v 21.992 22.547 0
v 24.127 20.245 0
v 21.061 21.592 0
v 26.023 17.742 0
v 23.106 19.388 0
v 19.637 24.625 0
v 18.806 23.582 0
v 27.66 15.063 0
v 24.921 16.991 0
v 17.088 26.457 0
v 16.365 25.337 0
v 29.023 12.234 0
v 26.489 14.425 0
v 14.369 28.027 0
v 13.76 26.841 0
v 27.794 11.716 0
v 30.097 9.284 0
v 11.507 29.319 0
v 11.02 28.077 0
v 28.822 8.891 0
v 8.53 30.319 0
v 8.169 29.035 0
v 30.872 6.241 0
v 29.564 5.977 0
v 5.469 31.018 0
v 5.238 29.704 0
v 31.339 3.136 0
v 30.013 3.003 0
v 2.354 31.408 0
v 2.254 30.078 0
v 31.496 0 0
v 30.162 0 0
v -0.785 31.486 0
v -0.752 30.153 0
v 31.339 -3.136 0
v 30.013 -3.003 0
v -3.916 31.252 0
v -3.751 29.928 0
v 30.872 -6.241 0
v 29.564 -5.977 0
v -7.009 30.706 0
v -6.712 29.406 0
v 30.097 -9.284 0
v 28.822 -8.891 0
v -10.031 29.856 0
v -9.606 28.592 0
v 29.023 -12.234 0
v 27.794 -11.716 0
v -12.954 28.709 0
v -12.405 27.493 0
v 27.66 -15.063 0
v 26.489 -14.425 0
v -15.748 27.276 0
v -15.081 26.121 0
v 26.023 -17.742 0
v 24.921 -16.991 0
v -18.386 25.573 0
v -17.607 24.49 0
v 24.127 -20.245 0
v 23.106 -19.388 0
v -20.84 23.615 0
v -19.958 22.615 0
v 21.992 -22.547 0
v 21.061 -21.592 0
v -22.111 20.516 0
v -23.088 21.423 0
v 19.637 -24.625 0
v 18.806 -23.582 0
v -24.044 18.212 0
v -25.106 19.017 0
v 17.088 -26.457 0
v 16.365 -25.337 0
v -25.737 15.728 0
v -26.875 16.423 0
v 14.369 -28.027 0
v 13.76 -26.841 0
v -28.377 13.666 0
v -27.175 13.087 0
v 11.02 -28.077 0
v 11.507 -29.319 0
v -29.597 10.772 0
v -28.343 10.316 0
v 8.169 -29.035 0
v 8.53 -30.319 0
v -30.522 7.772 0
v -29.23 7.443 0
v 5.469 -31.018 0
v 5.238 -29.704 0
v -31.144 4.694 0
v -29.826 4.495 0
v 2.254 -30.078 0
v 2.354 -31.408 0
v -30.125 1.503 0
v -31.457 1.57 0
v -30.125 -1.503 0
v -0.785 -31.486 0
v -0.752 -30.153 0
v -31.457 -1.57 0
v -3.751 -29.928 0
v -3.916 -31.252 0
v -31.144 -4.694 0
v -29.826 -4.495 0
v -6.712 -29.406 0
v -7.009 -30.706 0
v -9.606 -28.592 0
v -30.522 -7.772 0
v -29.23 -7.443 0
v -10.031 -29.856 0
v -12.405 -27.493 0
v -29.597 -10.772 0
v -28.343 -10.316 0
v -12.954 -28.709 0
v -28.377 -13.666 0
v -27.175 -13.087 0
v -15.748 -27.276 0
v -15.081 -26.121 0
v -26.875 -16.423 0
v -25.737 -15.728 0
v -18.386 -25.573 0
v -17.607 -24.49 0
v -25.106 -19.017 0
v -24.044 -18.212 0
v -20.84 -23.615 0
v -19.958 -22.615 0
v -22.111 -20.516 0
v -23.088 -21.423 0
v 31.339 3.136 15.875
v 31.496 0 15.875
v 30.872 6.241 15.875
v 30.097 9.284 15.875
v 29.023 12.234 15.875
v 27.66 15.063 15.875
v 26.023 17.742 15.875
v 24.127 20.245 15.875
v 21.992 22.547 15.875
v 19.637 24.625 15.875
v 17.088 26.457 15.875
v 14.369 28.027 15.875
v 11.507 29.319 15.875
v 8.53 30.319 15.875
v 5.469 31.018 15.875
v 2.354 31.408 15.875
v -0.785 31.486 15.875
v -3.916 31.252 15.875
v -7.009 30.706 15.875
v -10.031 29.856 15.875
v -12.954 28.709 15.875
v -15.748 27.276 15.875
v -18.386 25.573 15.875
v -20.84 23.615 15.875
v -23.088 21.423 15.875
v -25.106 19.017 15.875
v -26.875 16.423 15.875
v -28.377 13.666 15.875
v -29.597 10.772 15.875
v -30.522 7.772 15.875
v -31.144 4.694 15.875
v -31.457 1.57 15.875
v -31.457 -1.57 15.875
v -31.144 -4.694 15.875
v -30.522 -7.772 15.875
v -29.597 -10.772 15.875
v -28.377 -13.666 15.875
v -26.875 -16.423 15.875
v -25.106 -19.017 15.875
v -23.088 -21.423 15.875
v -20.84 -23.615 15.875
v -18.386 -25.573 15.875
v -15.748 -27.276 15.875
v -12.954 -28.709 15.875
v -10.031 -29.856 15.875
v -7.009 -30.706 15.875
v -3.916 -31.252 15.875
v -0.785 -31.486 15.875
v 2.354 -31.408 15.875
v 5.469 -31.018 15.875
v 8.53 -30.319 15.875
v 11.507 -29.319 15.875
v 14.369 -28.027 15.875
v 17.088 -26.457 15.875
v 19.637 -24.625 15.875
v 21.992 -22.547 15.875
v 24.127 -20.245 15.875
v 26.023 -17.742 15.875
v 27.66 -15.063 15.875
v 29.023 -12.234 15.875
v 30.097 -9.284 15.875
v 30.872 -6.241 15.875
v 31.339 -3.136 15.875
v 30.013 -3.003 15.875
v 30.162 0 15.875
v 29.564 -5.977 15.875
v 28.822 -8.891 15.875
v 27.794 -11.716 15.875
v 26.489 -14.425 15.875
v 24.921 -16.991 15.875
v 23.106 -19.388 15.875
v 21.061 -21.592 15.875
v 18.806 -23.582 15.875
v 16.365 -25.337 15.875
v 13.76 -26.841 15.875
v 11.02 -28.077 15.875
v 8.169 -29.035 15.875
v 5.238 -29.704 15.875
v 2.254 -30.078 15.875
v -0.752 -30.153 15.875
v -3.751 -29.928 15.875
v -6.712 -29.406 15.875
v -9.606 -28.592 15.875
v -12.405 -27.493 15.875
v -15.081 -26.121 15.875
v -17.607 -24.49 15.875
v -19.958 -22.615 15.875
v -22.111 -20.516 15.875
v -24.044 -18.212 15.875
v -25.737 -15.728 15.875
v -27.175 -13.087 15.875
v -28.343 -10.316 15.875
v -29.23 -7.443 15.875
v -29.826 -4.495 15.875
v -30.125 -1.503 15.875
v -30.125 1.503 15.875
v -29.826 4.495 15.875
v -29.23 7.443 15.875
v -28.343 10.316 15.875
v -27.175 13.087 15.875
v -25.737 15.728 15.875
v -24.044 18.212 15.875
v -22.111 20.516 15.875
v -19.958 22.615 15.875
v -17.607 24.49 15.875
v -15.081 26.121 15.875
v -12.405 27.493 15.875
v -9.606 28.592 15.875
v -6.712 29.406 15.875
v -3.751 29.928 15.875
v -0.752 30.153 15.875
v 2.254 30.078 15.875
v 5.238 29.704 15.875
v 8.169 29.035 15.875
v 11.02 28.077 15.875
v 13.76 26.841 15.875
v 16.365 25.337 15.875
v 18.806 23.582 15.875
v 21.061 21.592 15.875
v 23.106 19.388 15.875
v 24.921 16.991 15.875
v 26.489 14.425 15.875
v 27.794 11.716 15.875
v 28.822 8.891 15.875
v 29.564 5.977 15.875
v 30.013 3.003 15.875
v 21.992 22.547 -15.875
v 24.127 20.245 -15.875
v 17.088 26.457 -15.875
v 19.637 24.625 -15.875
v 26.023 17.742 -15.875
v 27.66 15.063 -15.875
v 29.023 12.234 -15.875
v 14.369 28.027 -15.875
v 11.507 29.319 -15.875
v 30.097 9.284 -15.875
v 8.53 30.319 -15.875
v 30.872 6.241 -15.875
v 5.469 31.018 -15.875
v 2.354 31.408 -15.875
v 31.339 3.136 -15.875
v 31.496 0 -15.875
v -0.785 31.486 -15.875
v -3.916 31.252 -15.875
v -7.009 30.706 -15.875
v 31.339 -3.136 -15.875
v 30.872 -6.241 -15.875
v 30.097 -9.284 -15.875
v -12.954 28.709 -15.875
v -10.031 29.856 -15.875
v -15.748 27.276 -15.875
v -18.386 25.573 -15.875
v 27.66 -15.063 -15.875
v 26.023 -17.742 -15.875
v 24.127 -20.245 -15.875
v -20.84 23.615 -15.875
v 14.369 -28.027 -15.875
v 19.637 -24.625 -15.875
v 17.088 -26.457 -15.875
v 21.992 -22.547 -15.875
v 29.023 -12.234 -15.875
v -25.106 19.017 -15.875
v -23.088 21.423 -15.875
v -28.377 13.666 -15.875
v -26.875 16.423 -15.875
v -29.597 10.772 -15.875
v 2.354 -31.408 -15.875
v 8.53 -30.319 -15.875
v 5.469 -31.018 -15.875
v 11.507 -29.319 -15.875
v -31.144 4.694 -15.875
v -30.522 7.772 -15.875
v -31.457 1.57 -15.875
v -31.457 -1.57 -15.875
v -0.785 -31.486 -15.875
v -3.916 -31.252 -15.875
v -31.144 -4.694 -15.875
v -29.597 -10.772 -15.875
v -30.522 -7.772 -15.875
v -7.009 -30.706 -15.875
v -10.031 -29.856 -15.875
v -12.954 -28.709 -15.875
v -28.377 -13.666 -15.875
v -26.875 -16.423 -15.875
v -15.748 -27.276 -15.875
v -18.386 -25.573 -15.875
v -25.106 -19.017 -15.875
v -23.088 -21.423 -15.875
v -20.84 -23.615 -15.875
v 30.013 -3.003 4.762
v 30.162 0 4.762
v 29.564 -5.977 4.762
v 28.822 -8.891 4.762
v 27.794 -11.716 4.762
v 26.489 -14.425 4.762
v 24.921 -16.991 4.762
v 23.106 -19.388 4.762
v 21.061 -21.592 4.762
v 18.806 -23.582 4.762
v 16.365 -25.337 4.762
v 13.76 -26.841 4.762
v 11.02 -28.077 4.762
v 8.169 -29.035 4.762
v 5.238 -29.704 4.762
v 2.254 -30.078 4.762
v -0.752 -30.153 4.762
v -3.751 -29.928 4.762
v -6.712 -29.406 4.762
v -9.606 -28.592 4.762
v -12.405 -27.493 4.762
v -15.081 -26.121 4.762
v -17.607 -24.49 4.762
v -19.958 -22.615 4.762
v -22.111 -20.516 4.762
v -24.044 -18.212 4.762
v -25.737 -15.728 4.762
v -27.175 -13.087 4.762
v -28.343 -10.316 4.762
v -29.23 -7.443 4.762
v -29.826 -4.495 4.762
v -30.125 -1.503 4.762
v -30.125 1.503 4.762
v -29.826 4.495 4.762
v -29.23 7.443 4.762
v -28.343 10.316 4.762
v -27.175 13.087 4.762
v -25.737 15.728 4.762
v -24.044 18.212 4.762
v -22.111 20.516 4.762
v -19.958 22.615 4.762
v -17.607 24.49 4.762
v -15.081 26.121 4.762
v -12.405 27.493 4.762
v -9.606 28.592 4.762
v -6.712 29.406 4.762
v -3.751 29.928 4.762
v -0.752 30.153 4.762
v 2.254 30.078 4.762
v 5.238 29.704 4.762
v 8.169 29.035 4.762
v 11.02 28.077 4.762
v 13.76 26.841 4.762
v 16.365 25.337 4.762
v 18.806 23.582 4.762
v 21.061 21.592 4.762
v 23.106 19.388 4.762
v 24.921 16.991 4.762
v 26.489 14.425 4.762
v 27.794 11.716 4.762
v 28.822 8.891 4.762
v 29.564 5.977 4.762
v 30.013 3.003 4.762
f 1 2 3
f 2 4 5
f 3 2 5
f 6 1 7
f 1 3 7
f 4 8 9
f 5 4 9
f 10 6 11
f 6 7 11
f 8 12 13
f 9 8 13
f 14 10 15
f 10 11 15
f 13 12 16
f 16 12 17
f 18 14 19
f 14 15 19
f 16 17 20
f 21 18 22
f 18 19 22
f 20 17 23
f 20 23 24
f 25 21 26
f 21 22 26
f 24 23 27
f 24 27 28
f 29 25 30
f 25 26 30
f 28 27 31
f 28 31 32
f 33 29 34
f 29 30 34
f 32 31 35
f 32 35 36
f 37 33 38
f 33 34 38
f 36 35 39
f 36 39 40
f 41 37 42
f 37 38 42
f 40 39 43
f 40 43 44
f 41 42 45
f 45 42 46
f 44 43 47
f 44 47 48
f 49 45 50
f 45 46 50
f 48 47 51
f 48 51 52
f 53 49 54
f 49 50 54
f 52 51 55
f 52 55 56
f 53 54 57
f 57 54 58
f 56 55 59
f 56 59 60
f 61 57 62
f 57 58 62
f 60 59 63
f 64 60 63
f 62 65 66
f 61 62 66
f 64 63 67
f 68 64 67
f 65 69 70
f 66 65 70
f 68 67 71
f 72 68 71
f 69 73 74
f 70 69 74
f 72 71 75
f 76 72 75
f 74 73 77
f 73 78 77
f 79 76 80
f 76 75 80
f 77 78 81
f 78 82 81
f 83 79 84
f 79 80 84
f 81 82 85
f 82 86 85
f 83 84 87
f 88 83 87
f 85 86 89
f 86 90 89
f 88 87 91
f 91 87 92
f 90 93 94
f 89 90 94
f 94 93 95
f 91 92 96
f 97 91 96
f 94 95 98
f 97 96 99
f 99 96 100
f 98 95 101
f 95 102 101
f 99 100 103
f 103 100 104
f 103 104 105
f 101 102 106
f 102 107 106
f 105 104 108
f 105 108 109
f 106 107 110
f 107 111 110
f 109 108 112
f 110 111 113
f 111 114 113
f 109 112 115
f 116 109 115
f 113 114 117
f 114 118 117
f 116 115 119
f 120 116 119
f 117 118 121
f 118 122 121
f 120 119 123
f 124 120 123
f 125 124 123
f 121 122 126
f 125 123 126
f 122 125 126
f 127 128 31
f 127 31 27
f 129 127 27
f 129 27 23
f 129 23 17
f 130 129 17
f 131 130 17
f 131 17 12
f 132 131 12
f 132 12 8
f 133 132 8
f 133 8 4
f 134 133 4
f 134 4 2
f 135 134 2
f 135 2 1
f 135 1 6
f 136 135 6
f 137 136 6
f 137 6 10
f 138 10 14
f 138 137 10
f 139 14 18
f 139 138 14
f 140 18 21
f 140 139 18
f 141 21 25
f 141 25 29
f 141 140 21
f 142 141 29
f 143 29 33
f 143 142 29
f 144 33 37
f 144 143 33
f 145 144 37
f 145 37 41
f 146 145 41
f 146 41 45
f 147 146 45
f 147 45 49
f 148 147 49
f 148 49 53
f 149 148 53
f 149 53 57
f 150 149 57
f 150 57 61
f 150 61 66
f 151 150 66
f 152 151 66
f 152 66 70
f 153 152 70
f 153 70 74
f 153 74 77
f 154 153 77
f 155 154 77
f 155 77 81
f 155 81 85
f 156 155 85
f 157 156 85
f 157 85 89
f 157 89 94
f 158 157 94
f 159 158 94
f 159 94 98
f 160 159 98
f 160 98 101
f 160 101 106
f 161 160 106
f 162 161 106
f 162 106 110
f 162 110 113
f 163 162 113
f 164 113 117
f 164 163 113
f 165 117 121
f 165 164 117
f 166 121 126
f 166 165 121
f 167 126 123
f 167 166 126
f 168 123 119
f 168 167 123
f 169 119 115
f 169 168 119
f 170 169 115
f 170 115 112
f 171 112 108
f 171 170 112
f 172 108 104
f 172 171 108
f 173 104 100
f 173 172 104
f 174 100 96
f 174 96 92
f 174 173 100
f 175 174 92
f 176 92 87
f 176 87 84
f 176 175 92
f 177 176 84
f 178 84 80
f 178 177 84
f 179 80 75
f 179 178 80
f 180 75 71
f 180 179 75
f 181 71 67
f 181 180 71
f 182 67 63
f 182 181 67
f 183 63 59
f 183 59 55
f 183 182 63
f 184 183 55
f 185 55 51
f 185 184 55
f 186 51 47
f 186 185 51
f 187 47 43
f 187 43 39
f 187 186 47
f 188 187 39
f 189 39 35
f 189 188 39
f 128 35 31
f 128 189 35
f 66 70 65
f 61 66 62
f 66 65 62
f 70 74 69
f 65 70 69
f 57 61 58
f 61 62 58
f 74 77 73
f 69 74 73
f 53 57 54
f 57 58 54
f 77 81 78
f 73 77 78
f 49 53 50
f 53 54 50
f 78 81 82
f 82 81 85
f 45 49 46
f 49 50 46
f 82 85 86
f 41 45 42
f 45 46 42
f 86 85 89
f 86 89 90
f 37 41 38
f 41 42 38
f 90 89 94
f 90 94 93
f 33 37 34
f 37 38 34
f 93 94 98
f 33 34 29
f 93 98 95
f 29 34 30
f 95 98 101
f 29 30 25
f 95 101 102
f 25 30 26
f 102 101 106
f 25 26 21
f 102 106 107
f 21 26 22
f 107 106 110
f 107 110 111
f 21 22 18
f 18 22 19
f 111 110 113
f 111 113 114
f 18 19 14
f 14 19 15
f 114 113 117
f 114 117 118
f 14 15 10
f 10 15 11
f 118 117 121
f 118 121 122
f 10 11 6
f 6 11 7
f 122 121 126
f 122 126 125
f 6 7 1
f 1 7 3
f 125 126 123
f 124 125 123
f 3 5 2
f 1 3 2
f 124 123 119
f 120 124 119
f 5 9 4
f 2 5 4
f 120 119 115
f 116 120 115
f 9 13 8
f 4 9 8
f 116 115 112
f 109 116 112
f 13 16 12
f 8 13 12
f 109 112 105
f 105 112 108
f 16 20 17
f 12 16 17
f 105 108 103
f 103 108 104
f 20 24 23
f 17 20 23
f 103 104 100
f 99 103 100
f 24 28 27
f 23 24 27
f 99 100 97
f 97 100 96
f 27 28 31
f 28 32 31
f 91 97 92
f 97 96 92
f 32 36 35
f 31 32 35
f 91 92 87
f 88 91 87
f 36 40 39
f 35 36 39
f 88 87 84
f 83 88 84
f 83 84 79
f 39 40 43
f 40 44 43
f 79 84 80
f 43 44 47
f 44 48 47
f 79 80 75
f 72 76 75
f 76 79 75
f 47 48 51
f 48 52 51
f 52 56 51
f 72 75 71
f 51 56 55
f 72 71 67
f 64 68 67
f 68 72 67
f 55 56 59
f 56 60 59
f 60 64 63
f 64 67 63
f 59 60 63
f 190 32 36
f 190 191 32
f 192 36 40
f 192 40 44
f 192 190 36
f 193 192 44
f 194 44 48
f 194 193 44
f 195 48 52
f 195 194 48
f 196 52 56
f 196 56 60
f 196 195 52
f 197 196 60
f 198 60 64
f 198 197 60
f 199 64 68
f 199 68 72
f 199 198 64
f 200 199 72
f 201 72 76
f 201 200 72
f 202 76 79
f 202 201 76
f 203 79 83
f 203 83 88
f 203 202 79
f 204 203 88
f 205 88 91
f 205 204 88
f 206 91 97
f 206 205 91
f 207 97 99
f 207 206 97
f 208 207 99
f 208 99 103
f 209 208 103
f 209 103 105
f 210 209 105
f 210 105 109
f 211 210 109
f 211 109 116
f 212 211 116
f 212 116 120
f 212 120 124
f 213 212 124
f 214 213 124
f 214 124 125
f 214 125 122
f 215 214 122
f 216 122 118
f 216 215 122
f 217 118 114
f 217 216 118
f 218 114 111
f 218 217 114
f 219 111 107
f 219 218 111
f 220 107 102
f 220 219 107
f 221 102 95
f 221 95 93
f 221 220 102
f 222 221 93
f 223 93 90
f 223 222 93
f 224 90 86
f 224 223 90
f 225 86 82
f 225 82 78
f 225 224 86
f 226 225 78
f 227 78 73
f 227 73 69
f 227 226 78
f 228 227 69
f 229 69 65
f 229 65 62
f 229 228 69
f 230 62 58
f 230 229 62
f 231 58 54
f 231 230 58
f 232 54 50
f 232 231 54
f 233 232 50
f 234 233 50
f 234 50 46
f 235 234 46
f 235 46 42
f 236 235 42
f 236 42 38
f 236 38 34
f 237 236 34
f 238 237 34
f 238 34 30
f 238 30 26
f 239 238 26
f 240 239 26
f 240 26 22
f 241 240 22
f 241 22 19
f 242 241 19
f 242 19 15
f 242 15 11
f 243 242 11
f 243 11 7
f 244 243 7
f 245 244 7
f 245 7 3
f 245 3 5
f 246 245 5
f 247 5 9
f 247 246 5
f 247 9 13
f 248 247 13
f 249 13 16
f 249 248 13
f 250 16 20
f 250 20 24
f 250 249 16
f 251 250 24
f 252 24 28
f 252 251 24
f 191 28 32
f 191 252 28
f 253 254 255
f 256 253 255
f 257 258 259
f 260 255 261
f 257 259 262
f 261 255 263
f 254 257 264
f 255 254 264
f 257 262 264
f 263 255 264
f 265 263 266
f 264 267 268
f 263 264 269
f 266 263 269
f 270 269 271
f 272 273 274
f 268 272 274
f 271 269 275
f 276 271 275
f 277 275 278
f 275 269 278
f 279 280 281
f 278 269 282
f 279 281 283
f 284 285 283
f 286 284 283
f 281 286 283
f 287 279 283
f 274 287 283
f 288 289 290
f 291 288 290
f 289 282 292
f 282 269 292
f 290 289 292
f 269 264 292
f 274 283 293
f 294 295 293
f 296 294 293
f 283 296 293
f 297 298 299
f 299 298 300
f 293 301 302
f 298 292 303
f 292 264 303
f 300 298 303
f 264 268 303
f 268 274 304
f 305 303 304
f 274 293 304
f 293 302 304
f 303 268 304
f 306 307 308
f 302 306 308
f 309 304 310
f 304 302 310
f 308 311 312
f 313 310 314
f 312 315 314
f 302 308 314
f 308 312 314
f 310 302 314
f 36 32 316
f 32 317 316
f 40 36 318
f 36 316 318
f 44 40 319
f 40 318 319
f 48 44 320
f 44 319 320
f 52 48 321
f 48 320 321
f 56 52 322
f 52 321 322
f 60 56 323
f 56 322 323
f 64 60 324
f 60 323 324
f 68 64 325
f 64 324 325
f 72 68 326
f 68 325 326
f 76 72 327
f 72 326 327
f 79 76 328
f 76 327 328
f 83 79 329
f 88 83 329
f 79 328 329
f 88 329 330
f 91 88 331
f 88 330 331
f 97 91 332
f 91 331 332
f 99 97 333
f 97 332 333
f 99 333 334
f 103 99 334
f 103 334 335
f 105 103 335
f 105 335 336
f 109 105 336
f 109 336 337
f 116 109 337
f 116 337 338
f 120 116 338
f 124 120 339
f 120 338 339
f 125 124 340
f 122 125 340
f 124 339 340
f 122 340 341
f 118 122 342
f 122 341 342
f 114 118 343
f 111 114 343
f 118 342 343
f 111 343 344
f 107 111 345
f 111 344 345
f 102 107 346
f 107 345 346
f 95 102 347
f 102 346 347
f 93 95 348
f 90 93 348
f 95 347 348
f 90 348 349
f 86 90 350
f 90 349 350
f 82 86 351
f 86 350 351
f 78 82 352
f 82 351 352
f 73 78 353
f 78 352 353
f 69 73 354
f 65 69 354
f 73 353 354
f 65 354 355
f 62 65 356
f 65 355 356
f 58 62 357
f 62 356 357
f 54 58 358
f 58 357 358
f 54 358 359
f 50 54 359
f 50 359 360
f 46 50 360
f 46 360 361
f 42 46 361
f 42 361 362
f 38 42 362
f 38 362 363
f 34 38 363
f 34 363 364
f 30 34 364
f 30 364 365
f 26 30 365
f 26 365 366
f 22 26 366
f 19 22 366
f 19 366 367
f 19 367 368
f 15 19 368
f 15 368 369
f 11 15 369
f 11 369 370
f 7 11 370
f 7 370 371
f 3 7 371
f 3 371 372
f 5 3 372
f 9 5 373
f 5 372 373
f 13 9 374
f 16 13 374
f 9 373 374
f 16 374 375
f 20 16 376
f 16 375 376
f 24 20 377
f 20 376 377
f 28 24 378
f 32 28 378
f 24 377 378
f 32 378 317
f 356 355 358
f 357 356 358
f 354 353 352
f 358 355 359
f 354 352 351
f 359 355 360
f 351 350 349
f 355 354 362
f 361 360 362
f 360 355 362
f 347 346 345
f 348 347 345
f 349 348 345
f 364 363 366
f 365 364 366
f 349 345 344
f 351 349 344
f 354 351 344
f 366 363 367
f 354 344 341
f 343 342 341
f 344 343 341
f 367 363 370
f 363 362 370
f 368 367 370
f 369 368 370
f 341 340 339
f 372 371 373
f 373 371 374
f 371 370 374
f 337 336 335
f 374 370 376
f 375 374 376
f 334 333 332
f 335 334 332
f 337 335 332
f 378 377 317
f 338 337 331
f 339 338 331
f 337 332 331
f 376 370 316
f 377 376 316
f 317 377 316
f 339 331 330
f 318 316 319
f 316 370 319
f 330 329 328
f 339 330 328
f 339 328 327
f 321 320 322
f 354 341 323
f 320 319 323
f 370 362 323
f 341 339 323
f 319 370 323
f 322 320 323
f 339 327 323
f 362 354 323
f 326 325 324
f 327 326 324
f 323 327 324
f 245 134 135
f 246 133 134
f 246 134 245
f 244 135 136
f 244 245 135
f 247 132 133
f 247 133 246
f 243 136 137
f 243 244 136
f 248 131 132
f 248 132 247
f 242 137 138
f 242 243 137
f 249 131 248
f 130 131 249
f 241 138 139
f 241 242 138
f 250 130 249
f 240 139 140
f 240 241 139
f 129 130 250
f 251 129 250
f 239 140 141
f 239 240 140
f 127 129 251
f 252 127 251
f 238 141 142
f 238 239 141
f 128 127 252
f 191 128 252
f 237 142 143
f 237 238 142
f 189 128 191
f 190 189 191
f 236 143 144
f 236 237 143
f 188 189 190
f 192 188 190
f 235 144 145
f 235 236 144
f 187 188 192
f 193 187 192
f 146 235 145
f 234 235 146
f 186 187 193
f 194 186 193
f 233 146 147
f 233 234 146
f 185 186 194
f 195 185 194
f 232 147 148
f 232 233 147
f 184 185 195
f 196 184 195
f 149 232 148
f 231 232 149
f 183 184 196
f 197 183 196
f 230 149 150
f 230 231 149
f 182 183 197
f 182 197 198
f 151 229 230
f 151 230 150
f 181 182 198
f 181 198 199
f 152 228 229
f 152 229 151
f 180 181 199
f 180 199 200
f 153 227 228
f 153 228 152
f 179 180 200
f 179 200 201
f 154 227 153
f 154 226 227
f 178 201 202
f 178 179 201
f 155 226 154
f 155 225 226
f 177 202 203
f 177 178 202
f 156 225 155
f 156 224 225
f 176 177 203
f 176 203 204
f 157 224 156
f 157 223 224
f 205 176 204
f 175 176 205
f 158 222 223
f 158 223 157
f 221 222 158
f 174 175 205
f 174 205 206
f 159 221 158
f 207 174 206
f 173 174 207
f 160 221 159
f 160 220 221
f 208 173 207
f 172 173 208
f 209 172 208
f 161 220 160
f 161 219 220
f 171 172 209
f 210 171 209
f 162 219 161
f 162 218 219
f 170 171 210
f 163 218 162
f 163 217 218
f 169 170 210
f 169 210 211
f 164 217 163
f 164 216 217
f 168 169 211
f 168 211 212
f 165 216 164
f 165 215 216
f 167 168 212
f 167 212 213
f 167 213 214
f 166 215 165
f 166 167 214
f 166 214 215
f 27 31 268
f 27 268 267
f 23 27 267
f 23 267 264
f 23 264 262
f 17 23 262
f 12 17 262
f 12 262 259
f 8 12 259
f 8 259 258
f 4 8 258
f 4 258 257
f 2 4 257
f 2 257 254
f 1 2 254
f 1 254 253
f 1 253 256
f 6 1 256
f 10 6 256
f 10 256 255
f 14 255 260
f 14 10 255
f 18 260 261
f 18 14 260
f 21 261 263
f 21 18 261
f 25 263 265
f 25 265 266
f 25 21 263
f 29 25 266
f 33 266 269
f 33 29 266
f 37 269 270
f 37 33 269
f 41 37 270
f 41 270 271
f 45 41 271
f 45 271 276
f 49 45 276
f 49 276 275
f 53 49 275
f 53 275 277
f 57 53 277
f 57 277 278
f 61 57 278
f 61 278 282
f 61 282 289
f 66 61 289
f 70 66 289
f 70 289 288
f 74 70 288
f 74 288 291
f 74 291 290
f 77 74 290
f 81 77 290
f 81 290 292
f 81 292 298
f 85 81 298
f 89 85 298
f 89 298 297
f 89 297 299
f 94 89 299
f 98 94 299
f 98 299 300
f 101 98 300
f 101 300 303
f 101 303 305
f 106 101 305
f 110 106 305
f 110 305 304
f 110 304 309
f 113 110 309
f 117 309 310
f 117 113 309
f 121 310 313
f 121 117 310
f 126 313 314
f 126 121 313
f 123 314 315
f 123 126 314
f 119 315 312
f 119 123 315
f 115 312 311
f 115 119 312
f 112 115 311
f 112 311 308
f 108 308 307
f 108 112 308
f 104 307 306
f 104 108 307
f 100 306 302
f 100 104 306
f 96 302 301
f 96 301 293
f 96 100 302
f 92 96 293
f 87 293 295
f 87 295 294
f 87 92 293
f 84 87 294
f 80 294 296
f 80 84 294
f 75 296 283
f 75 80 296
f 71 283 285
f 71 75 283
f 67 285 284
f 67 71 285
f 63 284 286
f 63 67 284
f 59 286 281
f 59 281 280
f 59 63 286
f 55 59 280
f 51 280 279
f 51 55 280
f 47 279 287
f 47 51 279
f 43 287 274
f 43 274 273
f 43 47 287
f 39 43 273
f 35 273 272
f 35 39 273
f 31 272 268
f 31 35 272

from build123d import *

# Parameters (mm, degrees)
F3_W     = 1.5875
F3_H     = 15.875
F5_R     = 31.75
F5_R_2   = 31.496
F6_DEPTH = 31.751


with BuildPart() as f2:
    # F1 (on Front) → F2 (revolve)
    with BuildSketch(Plane.XZ):
        Polygon((30.1625, 0), (30.1625, 4.7625), (0, 4.7625), (0, -15.875), (31.75, -15.875), (31.75, 0), align=None)
    revolve(axis=Axis((0, 0, -16.009867), (0, 0, -1)))


with BuildPart() as f4:
    # F3 (on Front) → F4 (revolve)
    with BuildSketch(Plane.XZ):
        with Locations((30.95625, 7.9375)):
            Rectangle(F3_W, F3_H)
    revolve(axis=Axis((0, 0, -13.350507), (0, 0, -1)))


with BuildPart() as f6_tool:
    # F5 (on face) → F6 (new body, through all)
    with BuildSketch(Plane.XY.offset(15.875)):
        Circle(F5_R)
        Circle(F5_R_2, mode=Mode.SUBTRACT)
    extrude(amount=-F6_DEPTH)


with BuildPart() as f2_1:
    add(f2.part)

    # F6: cut by f6_tool
    add(f6_tool.part, mode=Mode.SUBTRACT)


with BuildPart() as f4_1:
    add(f4.part)

    # F6: cut by f6_tool
    add(f6_tool.part, mode=Mode.SUBTRACT)


solid = Compound([f2_1.part, f4_1.part])
